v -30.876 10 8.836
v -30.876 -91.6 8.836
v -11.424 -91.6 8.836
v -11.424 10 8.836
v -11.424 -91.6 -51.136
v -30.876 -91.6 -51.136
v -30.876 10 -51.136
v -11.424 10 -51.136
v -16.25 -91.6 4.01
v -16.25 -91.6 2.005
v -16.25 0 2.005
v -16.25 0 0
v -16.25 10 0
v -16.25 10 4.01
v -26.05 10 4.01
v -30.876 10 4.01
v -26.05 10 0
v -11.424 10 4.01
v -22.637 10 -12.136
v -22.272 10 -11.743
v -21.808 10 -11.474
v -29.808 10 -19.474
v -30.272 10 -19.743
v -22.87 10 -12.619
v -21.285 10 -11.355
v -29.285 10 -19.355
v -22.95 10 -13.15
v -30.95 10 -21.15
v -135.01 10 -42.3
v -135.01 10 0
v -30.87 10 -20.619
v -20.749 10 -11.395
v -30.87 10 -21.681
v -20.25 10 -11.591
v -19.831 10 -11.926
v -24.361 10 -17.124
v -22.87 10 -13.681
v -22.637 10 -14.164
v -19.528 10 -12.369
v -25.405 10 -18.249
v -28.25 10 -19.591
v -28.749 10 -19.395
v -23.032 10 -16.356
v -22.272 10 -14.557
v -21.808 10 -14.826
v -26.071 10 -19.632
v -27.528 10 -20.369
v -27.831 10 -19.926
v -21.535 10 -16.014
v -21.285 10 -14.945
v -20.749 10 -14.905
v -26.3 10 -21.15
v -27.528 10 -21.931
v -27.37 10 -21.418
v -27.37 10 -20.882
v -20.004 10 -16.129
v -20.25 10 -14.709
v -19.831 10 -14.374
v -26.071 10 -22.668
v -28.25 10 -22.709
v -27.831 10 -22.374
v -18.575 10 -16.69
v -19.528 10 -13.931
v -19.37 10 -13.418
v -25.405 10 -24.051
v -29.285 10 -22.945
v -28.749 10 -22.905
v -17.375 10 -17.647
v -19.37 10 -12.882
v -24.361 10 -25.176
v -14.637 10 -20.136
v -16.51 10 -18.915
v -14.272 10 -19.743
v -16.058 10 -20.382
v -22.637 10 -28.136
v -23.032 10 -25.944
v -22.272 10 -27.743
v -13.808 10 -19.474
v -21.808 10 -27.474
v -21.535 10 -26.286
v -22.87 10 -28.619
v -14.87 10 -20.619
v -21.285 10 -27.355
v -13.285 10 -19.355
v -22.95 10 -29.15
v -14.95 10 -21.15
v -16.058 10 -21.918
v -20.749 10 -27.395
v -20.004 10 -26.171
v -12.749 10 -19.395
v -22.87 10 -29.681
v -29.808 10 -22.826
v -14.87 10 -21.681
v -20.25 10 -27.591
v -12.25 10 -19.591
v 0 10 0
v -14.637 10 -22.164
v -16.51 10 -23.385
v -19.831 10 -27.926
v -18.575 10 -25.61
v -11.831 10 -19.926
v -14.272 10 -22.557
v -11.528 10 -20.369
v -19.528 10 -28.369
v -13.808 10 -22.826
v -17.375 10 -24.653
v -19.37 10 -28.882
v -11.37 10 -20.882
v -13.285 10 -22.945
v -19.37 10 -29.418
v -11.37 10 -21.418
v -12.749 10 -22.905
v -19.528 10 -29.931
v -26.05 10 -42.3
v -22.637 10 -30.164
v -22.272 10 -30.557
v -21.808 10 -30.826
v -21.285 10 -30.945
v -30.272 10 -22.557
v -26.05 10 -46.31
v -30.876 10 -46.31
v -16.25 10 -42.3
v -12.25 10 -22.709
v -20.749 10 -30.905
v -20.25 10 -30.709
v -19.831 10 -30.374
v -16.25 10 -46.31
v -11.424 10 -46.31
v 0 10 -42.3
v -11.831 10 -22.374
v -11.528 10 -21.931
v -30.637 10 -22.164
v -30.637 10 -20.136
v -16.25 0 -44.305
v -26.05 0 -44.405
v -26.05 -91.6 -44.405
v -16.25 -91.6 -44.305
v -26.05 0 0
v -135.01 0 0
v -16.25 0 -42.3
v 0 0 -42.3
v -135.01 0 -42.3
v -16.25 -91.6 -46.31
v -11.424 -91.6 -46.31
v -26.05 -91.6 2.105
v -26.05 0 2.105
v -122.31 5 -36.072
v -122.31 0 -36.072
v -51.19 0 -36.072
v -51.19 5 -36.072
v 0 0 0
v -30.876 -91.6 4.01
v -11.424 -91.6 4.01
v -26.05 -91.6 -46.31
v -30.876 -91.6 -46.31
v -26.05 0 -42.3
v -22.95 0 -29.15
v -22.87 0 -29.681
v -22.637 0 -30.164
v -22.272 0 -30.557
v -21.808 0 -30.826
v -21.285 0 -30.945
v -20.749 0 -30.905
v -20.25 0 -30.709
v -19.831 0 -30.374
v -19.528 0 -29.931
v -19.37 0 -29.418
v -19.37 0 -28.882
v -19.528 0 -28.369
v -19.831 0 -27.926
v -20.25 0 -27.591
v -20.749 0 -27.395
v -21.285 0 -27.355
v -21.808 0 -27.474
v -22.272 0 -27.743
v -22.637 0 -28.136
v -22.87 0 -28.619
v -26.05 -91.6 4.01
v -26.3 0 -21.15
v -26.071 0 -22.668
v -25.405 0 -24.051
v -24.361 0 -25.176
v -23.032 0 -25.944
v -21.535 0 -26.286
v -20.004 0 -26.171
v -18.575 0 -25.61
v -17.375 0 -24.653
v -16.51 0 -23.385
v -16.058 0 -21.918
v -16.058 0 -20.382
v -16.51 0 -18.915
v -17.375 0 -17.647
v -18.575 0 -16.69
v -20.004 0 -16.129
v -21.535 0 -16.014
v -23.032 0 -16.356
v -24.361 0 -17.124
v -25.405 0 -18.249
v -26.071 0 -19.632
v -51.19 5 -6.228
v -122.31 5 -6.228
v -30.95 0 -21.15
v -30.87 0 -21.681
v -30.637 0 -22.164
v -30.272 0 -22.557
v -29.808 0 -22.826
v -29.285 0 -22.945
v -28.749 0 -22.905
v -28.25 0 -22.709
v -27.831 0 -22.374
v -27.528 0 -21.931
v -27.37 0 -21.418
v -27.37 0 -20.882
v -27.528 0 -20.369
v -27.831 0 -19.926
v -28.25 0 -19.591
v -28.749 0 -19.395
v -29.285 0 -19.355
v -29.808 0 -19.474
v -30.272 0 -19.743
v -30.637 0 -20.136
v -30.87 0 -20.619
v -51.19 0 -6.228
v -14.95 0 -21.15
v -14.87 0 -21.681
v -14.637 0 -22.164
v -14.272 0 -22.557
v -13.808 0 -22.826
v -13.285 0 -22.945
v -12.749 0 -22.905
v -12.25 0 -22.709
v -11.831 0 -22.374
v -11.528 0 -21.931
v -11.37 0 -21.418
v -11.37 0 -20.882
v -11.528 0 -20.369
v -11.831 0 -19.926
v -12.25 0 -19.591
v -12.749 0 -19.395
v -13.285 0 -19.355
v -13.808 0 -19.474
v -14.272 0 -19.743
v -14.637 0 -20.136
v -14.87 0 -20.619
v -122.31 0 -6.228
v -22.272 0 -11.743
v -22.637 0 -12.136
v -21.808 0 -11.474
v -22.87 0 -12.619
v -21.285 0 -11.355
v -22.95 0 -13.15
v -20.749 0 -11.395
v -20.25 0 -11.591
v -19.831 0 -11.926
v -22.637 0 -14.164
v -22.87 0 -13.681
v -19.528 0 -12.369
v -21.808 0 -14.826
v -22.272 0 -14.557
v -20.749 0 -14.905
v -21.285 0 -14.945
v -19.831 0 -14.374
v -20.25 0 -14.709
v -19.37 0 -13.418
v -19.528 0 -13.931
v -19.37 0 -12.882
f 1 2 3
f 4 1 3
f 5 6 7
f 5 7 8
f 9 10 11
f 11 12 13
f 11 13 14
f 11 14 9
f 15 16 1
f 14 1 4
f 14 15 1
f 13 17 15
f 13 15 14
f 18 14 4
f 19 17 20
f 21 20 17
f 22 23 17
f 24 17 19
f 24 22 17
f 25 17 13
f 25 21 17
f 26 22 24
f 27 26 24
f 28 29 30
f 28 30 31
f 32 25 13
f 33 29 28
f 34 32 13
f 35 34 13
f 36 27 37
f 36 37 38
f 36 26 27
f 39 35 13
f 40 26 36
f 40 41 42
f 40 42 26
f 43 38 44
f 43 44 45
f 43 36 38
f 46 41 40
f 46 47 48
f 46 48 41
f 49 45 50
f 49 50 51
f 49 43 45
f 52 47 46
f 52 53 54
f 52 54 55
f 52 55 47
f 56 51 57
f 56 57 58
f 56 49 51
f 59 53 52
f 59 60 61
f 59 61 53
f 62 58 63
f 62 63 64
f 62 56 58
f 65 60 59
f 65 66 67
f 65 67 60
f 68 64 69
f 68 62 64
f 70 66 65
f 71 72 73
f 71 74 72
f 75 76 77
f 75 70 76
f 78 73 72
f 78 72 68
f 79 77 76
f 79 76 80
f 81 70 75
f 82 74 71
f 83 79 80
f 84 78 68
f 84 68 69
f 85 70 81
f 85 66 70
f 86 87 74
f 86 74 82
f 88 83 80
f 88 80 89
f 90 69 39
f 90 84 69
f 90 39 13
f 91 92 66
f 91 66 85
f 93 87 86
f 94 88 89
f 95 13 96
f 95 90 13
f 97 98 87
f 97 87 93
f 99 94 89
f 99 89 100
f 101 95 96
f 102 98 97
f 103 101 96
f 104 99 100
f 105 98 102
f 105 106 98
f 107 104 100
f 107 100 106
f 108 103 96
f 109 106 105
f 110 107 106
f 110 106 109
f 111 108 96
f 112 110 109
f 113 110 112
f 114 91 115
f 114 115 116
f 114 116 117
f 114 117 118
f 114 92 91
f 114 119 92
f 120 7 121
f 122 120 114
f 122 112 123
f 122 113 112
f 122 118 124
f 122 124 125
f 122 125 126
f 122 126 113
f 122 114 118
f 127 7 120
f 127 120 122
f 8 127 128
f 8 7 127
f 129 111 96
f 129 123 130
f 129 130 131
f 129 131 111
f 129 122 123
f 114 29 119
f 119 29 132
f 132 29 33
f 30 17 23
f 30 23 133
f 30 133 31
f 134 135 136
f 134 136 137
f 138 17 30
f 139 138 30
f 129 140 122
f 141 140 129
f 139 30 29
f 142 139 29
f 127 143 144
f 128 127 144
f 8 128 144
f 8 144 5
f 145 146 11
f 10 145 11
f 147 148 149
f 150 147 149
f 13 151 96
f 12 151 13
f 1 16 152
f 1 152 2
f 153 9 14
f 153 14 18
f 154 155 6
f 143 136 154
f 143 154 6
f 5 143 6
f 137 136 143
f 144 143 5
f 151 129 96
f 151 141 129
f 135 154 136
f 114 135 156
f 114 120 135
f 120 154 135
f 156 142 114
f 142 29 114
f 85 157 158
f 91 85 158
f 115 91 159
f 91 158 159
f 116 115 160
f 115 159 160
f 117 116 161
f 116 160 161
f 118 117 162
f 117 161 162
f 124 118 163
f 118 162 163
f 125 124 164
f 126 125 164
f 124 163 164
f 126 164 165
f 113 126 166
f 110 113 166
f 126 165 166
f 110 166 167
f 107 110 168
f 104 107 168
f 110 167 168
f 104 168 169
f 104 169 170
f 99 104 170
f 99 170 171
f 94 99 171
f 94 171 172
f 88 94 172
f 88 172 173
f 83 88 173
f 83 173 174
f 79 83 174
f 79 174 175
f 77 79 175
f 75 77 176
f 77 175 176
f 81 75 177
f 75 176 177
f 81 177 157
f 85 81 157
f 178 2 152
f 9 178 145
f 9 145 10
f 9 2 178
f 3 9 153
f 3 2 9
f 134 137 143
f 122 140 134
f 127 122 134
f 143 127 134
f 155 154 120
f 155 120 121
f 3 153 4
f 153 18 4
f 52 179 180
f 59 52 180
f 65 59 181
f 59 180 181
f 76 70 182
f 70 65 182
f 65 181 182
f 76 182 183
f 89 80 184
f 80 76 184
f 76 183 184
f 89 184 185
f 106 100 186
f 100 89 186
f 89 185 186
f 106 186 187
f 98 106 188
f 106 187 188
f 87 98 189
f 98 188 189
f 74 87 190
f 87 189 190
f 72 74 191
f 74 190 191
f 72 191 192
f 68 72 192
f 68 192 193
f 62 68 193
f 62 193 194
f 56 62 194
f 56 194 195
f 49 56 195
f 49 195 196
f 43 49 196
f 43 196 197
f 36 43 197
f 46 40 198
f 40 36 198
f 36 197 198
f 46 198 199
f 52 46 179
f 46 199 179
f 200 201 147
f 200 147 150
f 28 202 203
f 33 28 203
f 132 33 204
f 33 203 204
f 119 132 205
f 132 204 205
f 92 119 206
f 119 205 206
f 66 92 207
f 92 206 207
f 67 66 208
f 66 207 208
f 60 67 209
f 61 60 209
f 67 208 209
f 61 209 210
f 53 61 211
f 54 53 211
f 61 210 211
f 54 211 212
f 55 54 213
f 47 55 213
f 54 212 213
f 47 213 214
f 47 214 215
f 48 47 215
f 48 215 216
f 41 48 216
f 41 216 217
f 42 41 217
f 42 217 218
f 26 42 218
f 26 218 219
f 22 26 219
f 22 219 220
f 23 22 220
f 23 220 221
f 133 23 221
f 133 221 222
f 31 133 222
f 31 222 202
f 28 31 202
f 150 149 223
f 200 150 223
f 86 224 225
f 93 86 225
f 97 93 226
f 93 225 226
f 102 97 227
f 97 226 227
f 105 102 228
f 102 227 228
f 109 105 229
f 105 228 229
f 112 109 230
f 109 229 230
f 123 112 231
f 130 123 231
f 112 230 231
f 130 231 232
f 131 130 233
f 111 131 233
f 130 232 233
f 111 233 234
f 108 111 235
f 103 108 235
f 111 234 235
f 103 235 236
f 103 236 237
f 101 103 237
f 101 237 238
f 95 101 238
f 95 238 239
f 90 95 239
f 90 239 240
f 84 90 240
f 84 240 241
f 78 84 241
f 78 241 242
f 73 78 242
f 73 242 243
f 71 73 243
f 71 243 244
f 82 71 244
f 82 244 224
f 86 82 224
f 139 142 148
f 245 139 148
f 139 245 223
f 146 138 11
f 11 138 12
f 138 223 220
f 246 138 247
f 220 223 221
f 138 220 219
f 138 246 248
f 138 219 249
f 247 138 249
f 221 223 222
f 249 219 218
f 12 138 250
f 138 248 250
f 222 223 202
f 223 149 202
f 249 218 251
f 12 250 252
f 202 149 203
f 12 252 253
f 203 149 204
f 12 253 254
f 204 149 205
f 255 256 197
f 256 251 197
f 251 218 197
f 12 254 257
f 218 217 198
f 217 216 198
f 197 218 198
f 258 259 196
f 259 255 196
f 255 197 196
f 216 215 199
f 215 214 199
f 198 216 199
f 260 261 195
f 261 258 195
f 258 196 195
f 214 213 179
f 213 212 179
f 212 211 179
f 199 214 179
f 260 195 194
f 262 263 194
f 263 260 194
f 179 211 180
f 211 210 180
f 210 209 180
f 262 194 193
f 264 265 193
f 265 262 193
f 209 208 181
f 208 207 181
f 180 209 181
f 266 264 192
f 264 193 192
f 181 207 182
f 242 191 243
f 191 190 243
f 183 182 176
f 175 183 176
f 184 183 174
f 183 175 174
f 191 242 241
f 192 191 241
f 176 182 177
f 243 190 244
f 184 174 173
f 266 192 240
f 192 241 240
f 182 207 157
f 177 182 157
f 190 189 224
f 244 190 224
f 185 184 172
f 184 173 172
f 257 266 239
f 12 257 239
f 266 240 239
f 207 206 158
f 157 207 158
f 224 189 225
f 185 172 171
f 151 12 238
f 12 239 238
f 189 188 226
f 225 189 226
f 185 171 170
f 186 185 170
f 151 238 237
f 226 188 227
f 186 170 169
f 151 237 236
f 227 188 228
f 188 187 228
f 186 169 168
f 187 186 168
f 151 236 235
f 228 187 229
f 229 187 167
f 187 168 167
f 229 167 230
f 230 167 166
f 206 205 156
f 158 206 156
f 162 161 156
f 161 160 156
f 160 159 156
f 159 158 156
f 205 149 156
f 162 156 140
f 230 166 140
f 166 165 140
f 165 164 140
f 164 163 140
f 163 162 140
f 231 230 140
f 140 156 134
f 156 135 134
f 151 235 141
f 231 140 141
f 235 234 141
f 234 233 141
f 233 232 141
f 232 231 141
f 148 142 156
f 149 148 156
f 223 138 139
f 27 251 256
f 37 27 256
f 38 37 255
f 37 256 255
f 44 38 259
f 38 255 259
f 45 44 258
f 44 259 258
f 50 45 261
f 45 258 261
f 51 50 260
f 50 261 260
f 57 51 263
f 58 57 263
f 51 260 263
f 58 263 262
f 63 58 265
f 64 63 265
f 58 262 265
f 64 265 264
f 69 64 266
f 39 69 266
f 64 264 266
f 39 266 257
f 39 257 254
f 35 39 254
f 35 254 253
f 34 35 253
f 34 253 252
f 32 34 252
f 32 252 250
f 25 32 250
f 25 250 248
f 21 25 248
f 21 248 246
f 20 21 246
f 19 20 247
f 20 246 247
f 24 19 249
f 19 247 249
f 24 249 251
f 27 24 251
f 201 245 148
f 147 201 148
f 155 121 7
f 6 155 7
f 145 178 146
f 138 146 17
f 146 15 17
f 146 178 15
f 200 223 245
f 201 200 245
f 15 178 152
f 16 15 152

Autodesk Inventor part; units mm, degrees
ref_plane "YZ Plane" through (0, 0, 0) normal (1, 0, 0) x (0, 1, 0)
ref_plane "XZ Plane" through (0, 0, 0) normal (0, 1, 0) x (-1, 0, 0)
ref_plane "XY Plane" through (0, 0, 0) normal (0, 0, 1) x (1, 0, 0)
sketch "Sketch1" plane through (0, 0, 0) normal (0, 1, 0) x (-1, 0, 0)
  line L0 (0, 0) -> (42.3, 0)
  line L1 (42.3, 0) -> (42.3, -42.3)
  line L2 (42.3, -42.3) -> (0, -42.3)
  line L3 (0, -42.3) -> (0, 0)
  circle A0 centre (21.15, -21.15) radius 5.15
  circle A1 centre (29.15, -21.15) radius 1.8
  circle A2 centre (21.15, -21.15) radius 8
  circle A3 centre (21.15, -13.15) radius 1.8
  circle A4 centre (13.15, -21.15) radius 1.8
  circle A5 centre (21.15, -29.15) radius 1.8
  point P0 (0, -21.15)
  point P1 (21.15, -42.3)
  dimension "d4" = 16
  dimension "d0" = 42.3
  dimension "d2" = 10.3
  dimension "d3" = 3.6
  dimension "d7" = 360
extrude "Extrusion1" add sketch "Sketch1" along normal blind 10 contours L0 L1 L2 L3 | A1 A2 A5 A4 A3
sketch "Sketch2" plane through (0, 10, 0) normal (0, 1, 0) x (1, 0, 0)
  line L0 (-42.3, 0) -> (0, 0) construction
  circle A0 centre (-13.15, 21.15) radius 1.8 construction
  circle A1 centre (-29.15, 21.15) radius 1.8 construction
  line L1 (-42.3, 0) -> (0, 0) construction
  line L2 (-16.25, 0) -> (-16.25, -3.81)
  line L3 (-16.25, -3.81) -> (-26.05, -3.81)
  line L4 (-26.05, -3.81) -> (-26.05, 0)
  line L5 (-26.05, 0) -> (-16.25, 0)
  line L6 (-13.15, 21.15) -> (-29.15, 21.15)
  line L7 (-42.3, 42.3) -> (0, 42.3) construction
  line L8 (-42.3, 42.3) -> (0, 42.3) construction
  line L9 (-16.25, 42.3) -> (-16.25, 46.11)
  line L10 (-16.25, 46.11) -> (-26.05, 46.11)
  line L11 (-26.05, 46.11) -> (-26.05, 42.3)
  line L12 (-26.05, 42.3) -> (-16.25, 42.3)
  line L13 (-16.25, 46.11) -> (-16.25, 46.31)
  line L14 (-16.25, 46.31) -> (-11.424, 46.31)
  line L15 (-11.424, 46.31) -> (-11.424, 51.136)
  line L16 (-26.05, 46.11) -> (-26.05, 46.31)
  line L17 (-26.05, 46.31) -> (-30.876, 46.31)
  line L18 (-30.876, 46.31) -> (-30.876, 51.136)
  line L19 (-30.876, 51.136) -> (-11.424, 51.136)
  line L20 (-16.25, -3.81) -> (-16.25, -4.01)
  line L21 (-16.25, -4.01) -> (-11.424, -4.01)
  line L22 (-11.424, -4.01) -> (-11.424, -8.836)
  line L23 (-26.05, -3.81) -> (-26.05, -4.01)
  line L24 (-26.05, -4.01) -> (-30.876, -4.01)
  line L25 (-30.876, -4.01) -> (-30.876, -8.836)
  line L26 (-30.876, -8.836) -> (-11.424, -8.836)
  point P0 (-21.15, -3.81)
  point P1 (-21.15, 0)
  point P2 (-21.15, 46.11)
  point P3 (-21.15, 42.3)
  dimension "d11" = 3.81
  dimension "d12" = 9.8
  dimension "d28" = 0.2
  dimension "d29" = 4.826
  dimension "d30" = 4.826
  dimension "d31" = 0.2
  dimension "d32" = 4.826
  dimension "d33" = 4.826
extrude "Extrusion2" add sketch "Sketch2" against normal blind 10
sketch "Sketch3" plane through (0, 0, 0) normal (0, -1, 0) x (1, 0, 0)
  circle A0 centre (-13.15, -21.15) radius 1.8 construction
  circle A1 centre (-29.15, -21.15) radius 1.8 construction
  line L0 (-13.15, -21.15) -> (-29.15, -21.15)
  line L1 (-16.25, 0) -> (-16.25, 4.01) construction
  line L2 (-11.424, 4.01) -> (-11.424, 8.836) construction
  line L3 (-30.876, 8.836) -> (-30.876, 4.01) construction
  line L4 (-30.876, 4.01) -> (-26.05, 4.01) construction
  line L5 (-26.05, 4.01) -> (-26.05, 0) construction
  line L6 (-16.25, 4.01) -> (-11.424, 4.01)
  line L7 (-11.424, 4.01) -> (-11.424, 8.836)
  line L8 (-11.424, 8.836) -> (-30.876, 8.836)
  line L9 (-30.876, 8.836) -> (-30.876, 4.01)
  line L10 (-30.876, 4.01) -> (-26.05, 4.01)
  line L11 (-26.05, 4.01) -> (-26.05, 2.105)
  line L12 (-26.05, 2.105) -> (-16.25, 2.005)
  line L13 (-16.25, 4.01) -> (-16.25, 2.005)
  line L14 (-16.25, -42.3) -> (-16.25, -46.31) construction
  line L15 (-16.25, -46.31) -> (-11.424, -46.31) construction
  line L16 (-11.424, -46.31) -> (-11.424, -51.136) construction
  line L17 (-11.424, -51.136) -> (-30.876, -51.136) construction
  line L18 (-30.876, -51.136) -> (-30.876, -46.31) construction
  line L19 (-30.876, -46.31) -> (-26.05, -46.31) construction
  line L20 (-26.05, -46.31) -> (-26.05, -42.3) construction
  line L21 (-16.25, -46.31) -> (-11.424, -46.31)
  line L22 (-11.424, -46.31) -> (-11.424, -51.136)
  line L23 (-11.424, -51.136) -> (-30.876, -51.136)
  line L24 (-30.876, -51.136) -> (-30.876, -46.31)
  line L25 (-30.876, -46.31) -> (-26.05, -46.31)
  line L26 (-26.05, -46.31) -> (-26.05, -44.405)
  line L27 (-26.05, -44.405) -> (-16.25, -44.305)
  line L28 (-16.25, -46.31) -> (-16.25, -44.305)
  dimension "d34" = 1.905
extrude "Extrusion3" add sketch "Sketch3" along normal blind 91.6
sketch "Sketch4" plane through (0, 10, 0) normal (0, 1, 0) x (1, 0, 0)
  line L0 (-42.3, 0) -> (-135.01, 0)
  line L1 (-135.01, 0) -> (-135.01, 42.3)
  line L2 (-135.01, 42.3) -> (-42.3, 42.3)
  line L3 (-42.3, 0) -> (-42.3, 42.3)
  dimension "d17" = 92.71
extrude "Extrusion4" add sketch "Sketch4" against normal blind 10
sketch "Sketch5" plane through (0, 0, 0) normal (0, -1, 0) x (1, 0, 0)
  line L0 (-135.01, 0) -> (-135.01, -42.3) construction
  line L1 (-122.31, -36.0725) -> (-51.19, -36.0725)
  line L2 (-51.19, -36.0725) -> (-51.19, -6.2275)
  line L3 (-51.19, -6.2275) -> (-122.31, -6.2275)
  line L4 (-122.31, -6.2275) -> (-122.31, -36.0725)
  point P0 (-135.01, -7.62)
  point P1 (-135.01, -34.68)
  point P2 (-122.31, -21.15)
  point P3 (-135.01, -21.15)
  dimension "d35" = 71.12
  dimension "d36" = 29.845
  dimension "d37" = 12.7
extrude "Extrusion5" cut sketch "Sketch5" against normal blind 5
sketch "Sketch6" plane through (0, 10, 0) normal (0, 1, 0) x (1, 0, 0)
  line L0 (-135.01, 0) -> (-26.05, 0) construction
  line L1 (-30.876, -8.836) -> (-11.424, -8.836) construction
  line L2 (0, 0) -> (0, 42.3) construction
  line L3 (-11.424, 51.136) -> (-30.876, 51.136) construction
  line L4 (-30.876, 51.136) -> (-30.876, 46.31) construction
  line L5 (-26.05, 42.3) -> (-135.01, 42.3) construction
  line L6 (-135.01, 42.3) -> (-135.01, 0) construction
  circle A0 centre (-21.15, 21.15) radius 5.15 construction
  circle A1 centre (-21.15, 21.15) radius 11.43
  line L7 (0, 42.3) -> (0, 0)
  line L8 (0, 0) -> (-11.424, -8.836)
  line L9 (0, 42.3) -> (-11.424, 51.136)
  line L10 (-11.424, 51.136) -> (-30.876, 51.136)
  line L11 (-30.876, 51.136) -> (-30.876, 42.3)
  line L12 (-11.424, -8.836) -> (-30.876, -8.836)
  line L13 (-30.876, -8.836) -> (-30.876, 0)
  line L14 (-30.876, 0) -> (-135.01, 0)
  line L15 (-135.01, 0) -> (-135.01, 42.3)
  line L16 (-135.01, 42.3) -> (-30.876, 42.3)
  dimension "d40" = 22.86
extrude "Extrusion6" [suppressed]
chamfer "Chamfer3" [suppressed]
chamfer "Chamfer4" [suppressed]
sketch "Sketch7" plane through (-26.05, 10, -42.3) normal (0, 0, -1) x (-1, 0, 0)
  line L0 (5.08, 0) -> (5.08, 39.5) construction
  line L1 (0, -10) -> (108.96, -10) construction
  circle A0 centre (68.58, 2.7) radius 3.175
  circle A1 centre (55.88, 2.7) radius 3.175
  circle A2 centre (43.18, 2.7) radius 3.175
  circle A3 centre (30.48, 2.7) radius 3.175
  circle A4 centre (17.78, 2.7) radius 3.175
  circle A5 centre (62.23, 15.4) radius 3.175
  circle A6 centre (49.53, 15.4) radius 3.175
  circle A7 centre (36.83, 15.4) radius 3.175
  circle A8 centre (24.13, 15.4) radius 3.175
  circle A9 centre (11.43, 15.4) radius 3.175
  point P0 (101.34, -10)
  point P1 (-26.05, -10)
  dimension "d49" = 6.35
  dimension "d50" = 12.7
  dimension "d51" = 12.7
  dimension "d52" = 12.7
  dimension "d53" = 12.7
  dimension "d54" = 12.7
  dimension "d55" = 12.7
  dimension "d56" = 6.35
  dimension "d57" = 12.7
  dimension "d58" = 12.7
  dimension "d59" = 12.7
  dimension "d60" = 12.7
  dimension "d61" = 6.35
  dimension "d62" = 12.7
extrude "Extrusion7" [suppressed]
properties part number "ClawGrip"
